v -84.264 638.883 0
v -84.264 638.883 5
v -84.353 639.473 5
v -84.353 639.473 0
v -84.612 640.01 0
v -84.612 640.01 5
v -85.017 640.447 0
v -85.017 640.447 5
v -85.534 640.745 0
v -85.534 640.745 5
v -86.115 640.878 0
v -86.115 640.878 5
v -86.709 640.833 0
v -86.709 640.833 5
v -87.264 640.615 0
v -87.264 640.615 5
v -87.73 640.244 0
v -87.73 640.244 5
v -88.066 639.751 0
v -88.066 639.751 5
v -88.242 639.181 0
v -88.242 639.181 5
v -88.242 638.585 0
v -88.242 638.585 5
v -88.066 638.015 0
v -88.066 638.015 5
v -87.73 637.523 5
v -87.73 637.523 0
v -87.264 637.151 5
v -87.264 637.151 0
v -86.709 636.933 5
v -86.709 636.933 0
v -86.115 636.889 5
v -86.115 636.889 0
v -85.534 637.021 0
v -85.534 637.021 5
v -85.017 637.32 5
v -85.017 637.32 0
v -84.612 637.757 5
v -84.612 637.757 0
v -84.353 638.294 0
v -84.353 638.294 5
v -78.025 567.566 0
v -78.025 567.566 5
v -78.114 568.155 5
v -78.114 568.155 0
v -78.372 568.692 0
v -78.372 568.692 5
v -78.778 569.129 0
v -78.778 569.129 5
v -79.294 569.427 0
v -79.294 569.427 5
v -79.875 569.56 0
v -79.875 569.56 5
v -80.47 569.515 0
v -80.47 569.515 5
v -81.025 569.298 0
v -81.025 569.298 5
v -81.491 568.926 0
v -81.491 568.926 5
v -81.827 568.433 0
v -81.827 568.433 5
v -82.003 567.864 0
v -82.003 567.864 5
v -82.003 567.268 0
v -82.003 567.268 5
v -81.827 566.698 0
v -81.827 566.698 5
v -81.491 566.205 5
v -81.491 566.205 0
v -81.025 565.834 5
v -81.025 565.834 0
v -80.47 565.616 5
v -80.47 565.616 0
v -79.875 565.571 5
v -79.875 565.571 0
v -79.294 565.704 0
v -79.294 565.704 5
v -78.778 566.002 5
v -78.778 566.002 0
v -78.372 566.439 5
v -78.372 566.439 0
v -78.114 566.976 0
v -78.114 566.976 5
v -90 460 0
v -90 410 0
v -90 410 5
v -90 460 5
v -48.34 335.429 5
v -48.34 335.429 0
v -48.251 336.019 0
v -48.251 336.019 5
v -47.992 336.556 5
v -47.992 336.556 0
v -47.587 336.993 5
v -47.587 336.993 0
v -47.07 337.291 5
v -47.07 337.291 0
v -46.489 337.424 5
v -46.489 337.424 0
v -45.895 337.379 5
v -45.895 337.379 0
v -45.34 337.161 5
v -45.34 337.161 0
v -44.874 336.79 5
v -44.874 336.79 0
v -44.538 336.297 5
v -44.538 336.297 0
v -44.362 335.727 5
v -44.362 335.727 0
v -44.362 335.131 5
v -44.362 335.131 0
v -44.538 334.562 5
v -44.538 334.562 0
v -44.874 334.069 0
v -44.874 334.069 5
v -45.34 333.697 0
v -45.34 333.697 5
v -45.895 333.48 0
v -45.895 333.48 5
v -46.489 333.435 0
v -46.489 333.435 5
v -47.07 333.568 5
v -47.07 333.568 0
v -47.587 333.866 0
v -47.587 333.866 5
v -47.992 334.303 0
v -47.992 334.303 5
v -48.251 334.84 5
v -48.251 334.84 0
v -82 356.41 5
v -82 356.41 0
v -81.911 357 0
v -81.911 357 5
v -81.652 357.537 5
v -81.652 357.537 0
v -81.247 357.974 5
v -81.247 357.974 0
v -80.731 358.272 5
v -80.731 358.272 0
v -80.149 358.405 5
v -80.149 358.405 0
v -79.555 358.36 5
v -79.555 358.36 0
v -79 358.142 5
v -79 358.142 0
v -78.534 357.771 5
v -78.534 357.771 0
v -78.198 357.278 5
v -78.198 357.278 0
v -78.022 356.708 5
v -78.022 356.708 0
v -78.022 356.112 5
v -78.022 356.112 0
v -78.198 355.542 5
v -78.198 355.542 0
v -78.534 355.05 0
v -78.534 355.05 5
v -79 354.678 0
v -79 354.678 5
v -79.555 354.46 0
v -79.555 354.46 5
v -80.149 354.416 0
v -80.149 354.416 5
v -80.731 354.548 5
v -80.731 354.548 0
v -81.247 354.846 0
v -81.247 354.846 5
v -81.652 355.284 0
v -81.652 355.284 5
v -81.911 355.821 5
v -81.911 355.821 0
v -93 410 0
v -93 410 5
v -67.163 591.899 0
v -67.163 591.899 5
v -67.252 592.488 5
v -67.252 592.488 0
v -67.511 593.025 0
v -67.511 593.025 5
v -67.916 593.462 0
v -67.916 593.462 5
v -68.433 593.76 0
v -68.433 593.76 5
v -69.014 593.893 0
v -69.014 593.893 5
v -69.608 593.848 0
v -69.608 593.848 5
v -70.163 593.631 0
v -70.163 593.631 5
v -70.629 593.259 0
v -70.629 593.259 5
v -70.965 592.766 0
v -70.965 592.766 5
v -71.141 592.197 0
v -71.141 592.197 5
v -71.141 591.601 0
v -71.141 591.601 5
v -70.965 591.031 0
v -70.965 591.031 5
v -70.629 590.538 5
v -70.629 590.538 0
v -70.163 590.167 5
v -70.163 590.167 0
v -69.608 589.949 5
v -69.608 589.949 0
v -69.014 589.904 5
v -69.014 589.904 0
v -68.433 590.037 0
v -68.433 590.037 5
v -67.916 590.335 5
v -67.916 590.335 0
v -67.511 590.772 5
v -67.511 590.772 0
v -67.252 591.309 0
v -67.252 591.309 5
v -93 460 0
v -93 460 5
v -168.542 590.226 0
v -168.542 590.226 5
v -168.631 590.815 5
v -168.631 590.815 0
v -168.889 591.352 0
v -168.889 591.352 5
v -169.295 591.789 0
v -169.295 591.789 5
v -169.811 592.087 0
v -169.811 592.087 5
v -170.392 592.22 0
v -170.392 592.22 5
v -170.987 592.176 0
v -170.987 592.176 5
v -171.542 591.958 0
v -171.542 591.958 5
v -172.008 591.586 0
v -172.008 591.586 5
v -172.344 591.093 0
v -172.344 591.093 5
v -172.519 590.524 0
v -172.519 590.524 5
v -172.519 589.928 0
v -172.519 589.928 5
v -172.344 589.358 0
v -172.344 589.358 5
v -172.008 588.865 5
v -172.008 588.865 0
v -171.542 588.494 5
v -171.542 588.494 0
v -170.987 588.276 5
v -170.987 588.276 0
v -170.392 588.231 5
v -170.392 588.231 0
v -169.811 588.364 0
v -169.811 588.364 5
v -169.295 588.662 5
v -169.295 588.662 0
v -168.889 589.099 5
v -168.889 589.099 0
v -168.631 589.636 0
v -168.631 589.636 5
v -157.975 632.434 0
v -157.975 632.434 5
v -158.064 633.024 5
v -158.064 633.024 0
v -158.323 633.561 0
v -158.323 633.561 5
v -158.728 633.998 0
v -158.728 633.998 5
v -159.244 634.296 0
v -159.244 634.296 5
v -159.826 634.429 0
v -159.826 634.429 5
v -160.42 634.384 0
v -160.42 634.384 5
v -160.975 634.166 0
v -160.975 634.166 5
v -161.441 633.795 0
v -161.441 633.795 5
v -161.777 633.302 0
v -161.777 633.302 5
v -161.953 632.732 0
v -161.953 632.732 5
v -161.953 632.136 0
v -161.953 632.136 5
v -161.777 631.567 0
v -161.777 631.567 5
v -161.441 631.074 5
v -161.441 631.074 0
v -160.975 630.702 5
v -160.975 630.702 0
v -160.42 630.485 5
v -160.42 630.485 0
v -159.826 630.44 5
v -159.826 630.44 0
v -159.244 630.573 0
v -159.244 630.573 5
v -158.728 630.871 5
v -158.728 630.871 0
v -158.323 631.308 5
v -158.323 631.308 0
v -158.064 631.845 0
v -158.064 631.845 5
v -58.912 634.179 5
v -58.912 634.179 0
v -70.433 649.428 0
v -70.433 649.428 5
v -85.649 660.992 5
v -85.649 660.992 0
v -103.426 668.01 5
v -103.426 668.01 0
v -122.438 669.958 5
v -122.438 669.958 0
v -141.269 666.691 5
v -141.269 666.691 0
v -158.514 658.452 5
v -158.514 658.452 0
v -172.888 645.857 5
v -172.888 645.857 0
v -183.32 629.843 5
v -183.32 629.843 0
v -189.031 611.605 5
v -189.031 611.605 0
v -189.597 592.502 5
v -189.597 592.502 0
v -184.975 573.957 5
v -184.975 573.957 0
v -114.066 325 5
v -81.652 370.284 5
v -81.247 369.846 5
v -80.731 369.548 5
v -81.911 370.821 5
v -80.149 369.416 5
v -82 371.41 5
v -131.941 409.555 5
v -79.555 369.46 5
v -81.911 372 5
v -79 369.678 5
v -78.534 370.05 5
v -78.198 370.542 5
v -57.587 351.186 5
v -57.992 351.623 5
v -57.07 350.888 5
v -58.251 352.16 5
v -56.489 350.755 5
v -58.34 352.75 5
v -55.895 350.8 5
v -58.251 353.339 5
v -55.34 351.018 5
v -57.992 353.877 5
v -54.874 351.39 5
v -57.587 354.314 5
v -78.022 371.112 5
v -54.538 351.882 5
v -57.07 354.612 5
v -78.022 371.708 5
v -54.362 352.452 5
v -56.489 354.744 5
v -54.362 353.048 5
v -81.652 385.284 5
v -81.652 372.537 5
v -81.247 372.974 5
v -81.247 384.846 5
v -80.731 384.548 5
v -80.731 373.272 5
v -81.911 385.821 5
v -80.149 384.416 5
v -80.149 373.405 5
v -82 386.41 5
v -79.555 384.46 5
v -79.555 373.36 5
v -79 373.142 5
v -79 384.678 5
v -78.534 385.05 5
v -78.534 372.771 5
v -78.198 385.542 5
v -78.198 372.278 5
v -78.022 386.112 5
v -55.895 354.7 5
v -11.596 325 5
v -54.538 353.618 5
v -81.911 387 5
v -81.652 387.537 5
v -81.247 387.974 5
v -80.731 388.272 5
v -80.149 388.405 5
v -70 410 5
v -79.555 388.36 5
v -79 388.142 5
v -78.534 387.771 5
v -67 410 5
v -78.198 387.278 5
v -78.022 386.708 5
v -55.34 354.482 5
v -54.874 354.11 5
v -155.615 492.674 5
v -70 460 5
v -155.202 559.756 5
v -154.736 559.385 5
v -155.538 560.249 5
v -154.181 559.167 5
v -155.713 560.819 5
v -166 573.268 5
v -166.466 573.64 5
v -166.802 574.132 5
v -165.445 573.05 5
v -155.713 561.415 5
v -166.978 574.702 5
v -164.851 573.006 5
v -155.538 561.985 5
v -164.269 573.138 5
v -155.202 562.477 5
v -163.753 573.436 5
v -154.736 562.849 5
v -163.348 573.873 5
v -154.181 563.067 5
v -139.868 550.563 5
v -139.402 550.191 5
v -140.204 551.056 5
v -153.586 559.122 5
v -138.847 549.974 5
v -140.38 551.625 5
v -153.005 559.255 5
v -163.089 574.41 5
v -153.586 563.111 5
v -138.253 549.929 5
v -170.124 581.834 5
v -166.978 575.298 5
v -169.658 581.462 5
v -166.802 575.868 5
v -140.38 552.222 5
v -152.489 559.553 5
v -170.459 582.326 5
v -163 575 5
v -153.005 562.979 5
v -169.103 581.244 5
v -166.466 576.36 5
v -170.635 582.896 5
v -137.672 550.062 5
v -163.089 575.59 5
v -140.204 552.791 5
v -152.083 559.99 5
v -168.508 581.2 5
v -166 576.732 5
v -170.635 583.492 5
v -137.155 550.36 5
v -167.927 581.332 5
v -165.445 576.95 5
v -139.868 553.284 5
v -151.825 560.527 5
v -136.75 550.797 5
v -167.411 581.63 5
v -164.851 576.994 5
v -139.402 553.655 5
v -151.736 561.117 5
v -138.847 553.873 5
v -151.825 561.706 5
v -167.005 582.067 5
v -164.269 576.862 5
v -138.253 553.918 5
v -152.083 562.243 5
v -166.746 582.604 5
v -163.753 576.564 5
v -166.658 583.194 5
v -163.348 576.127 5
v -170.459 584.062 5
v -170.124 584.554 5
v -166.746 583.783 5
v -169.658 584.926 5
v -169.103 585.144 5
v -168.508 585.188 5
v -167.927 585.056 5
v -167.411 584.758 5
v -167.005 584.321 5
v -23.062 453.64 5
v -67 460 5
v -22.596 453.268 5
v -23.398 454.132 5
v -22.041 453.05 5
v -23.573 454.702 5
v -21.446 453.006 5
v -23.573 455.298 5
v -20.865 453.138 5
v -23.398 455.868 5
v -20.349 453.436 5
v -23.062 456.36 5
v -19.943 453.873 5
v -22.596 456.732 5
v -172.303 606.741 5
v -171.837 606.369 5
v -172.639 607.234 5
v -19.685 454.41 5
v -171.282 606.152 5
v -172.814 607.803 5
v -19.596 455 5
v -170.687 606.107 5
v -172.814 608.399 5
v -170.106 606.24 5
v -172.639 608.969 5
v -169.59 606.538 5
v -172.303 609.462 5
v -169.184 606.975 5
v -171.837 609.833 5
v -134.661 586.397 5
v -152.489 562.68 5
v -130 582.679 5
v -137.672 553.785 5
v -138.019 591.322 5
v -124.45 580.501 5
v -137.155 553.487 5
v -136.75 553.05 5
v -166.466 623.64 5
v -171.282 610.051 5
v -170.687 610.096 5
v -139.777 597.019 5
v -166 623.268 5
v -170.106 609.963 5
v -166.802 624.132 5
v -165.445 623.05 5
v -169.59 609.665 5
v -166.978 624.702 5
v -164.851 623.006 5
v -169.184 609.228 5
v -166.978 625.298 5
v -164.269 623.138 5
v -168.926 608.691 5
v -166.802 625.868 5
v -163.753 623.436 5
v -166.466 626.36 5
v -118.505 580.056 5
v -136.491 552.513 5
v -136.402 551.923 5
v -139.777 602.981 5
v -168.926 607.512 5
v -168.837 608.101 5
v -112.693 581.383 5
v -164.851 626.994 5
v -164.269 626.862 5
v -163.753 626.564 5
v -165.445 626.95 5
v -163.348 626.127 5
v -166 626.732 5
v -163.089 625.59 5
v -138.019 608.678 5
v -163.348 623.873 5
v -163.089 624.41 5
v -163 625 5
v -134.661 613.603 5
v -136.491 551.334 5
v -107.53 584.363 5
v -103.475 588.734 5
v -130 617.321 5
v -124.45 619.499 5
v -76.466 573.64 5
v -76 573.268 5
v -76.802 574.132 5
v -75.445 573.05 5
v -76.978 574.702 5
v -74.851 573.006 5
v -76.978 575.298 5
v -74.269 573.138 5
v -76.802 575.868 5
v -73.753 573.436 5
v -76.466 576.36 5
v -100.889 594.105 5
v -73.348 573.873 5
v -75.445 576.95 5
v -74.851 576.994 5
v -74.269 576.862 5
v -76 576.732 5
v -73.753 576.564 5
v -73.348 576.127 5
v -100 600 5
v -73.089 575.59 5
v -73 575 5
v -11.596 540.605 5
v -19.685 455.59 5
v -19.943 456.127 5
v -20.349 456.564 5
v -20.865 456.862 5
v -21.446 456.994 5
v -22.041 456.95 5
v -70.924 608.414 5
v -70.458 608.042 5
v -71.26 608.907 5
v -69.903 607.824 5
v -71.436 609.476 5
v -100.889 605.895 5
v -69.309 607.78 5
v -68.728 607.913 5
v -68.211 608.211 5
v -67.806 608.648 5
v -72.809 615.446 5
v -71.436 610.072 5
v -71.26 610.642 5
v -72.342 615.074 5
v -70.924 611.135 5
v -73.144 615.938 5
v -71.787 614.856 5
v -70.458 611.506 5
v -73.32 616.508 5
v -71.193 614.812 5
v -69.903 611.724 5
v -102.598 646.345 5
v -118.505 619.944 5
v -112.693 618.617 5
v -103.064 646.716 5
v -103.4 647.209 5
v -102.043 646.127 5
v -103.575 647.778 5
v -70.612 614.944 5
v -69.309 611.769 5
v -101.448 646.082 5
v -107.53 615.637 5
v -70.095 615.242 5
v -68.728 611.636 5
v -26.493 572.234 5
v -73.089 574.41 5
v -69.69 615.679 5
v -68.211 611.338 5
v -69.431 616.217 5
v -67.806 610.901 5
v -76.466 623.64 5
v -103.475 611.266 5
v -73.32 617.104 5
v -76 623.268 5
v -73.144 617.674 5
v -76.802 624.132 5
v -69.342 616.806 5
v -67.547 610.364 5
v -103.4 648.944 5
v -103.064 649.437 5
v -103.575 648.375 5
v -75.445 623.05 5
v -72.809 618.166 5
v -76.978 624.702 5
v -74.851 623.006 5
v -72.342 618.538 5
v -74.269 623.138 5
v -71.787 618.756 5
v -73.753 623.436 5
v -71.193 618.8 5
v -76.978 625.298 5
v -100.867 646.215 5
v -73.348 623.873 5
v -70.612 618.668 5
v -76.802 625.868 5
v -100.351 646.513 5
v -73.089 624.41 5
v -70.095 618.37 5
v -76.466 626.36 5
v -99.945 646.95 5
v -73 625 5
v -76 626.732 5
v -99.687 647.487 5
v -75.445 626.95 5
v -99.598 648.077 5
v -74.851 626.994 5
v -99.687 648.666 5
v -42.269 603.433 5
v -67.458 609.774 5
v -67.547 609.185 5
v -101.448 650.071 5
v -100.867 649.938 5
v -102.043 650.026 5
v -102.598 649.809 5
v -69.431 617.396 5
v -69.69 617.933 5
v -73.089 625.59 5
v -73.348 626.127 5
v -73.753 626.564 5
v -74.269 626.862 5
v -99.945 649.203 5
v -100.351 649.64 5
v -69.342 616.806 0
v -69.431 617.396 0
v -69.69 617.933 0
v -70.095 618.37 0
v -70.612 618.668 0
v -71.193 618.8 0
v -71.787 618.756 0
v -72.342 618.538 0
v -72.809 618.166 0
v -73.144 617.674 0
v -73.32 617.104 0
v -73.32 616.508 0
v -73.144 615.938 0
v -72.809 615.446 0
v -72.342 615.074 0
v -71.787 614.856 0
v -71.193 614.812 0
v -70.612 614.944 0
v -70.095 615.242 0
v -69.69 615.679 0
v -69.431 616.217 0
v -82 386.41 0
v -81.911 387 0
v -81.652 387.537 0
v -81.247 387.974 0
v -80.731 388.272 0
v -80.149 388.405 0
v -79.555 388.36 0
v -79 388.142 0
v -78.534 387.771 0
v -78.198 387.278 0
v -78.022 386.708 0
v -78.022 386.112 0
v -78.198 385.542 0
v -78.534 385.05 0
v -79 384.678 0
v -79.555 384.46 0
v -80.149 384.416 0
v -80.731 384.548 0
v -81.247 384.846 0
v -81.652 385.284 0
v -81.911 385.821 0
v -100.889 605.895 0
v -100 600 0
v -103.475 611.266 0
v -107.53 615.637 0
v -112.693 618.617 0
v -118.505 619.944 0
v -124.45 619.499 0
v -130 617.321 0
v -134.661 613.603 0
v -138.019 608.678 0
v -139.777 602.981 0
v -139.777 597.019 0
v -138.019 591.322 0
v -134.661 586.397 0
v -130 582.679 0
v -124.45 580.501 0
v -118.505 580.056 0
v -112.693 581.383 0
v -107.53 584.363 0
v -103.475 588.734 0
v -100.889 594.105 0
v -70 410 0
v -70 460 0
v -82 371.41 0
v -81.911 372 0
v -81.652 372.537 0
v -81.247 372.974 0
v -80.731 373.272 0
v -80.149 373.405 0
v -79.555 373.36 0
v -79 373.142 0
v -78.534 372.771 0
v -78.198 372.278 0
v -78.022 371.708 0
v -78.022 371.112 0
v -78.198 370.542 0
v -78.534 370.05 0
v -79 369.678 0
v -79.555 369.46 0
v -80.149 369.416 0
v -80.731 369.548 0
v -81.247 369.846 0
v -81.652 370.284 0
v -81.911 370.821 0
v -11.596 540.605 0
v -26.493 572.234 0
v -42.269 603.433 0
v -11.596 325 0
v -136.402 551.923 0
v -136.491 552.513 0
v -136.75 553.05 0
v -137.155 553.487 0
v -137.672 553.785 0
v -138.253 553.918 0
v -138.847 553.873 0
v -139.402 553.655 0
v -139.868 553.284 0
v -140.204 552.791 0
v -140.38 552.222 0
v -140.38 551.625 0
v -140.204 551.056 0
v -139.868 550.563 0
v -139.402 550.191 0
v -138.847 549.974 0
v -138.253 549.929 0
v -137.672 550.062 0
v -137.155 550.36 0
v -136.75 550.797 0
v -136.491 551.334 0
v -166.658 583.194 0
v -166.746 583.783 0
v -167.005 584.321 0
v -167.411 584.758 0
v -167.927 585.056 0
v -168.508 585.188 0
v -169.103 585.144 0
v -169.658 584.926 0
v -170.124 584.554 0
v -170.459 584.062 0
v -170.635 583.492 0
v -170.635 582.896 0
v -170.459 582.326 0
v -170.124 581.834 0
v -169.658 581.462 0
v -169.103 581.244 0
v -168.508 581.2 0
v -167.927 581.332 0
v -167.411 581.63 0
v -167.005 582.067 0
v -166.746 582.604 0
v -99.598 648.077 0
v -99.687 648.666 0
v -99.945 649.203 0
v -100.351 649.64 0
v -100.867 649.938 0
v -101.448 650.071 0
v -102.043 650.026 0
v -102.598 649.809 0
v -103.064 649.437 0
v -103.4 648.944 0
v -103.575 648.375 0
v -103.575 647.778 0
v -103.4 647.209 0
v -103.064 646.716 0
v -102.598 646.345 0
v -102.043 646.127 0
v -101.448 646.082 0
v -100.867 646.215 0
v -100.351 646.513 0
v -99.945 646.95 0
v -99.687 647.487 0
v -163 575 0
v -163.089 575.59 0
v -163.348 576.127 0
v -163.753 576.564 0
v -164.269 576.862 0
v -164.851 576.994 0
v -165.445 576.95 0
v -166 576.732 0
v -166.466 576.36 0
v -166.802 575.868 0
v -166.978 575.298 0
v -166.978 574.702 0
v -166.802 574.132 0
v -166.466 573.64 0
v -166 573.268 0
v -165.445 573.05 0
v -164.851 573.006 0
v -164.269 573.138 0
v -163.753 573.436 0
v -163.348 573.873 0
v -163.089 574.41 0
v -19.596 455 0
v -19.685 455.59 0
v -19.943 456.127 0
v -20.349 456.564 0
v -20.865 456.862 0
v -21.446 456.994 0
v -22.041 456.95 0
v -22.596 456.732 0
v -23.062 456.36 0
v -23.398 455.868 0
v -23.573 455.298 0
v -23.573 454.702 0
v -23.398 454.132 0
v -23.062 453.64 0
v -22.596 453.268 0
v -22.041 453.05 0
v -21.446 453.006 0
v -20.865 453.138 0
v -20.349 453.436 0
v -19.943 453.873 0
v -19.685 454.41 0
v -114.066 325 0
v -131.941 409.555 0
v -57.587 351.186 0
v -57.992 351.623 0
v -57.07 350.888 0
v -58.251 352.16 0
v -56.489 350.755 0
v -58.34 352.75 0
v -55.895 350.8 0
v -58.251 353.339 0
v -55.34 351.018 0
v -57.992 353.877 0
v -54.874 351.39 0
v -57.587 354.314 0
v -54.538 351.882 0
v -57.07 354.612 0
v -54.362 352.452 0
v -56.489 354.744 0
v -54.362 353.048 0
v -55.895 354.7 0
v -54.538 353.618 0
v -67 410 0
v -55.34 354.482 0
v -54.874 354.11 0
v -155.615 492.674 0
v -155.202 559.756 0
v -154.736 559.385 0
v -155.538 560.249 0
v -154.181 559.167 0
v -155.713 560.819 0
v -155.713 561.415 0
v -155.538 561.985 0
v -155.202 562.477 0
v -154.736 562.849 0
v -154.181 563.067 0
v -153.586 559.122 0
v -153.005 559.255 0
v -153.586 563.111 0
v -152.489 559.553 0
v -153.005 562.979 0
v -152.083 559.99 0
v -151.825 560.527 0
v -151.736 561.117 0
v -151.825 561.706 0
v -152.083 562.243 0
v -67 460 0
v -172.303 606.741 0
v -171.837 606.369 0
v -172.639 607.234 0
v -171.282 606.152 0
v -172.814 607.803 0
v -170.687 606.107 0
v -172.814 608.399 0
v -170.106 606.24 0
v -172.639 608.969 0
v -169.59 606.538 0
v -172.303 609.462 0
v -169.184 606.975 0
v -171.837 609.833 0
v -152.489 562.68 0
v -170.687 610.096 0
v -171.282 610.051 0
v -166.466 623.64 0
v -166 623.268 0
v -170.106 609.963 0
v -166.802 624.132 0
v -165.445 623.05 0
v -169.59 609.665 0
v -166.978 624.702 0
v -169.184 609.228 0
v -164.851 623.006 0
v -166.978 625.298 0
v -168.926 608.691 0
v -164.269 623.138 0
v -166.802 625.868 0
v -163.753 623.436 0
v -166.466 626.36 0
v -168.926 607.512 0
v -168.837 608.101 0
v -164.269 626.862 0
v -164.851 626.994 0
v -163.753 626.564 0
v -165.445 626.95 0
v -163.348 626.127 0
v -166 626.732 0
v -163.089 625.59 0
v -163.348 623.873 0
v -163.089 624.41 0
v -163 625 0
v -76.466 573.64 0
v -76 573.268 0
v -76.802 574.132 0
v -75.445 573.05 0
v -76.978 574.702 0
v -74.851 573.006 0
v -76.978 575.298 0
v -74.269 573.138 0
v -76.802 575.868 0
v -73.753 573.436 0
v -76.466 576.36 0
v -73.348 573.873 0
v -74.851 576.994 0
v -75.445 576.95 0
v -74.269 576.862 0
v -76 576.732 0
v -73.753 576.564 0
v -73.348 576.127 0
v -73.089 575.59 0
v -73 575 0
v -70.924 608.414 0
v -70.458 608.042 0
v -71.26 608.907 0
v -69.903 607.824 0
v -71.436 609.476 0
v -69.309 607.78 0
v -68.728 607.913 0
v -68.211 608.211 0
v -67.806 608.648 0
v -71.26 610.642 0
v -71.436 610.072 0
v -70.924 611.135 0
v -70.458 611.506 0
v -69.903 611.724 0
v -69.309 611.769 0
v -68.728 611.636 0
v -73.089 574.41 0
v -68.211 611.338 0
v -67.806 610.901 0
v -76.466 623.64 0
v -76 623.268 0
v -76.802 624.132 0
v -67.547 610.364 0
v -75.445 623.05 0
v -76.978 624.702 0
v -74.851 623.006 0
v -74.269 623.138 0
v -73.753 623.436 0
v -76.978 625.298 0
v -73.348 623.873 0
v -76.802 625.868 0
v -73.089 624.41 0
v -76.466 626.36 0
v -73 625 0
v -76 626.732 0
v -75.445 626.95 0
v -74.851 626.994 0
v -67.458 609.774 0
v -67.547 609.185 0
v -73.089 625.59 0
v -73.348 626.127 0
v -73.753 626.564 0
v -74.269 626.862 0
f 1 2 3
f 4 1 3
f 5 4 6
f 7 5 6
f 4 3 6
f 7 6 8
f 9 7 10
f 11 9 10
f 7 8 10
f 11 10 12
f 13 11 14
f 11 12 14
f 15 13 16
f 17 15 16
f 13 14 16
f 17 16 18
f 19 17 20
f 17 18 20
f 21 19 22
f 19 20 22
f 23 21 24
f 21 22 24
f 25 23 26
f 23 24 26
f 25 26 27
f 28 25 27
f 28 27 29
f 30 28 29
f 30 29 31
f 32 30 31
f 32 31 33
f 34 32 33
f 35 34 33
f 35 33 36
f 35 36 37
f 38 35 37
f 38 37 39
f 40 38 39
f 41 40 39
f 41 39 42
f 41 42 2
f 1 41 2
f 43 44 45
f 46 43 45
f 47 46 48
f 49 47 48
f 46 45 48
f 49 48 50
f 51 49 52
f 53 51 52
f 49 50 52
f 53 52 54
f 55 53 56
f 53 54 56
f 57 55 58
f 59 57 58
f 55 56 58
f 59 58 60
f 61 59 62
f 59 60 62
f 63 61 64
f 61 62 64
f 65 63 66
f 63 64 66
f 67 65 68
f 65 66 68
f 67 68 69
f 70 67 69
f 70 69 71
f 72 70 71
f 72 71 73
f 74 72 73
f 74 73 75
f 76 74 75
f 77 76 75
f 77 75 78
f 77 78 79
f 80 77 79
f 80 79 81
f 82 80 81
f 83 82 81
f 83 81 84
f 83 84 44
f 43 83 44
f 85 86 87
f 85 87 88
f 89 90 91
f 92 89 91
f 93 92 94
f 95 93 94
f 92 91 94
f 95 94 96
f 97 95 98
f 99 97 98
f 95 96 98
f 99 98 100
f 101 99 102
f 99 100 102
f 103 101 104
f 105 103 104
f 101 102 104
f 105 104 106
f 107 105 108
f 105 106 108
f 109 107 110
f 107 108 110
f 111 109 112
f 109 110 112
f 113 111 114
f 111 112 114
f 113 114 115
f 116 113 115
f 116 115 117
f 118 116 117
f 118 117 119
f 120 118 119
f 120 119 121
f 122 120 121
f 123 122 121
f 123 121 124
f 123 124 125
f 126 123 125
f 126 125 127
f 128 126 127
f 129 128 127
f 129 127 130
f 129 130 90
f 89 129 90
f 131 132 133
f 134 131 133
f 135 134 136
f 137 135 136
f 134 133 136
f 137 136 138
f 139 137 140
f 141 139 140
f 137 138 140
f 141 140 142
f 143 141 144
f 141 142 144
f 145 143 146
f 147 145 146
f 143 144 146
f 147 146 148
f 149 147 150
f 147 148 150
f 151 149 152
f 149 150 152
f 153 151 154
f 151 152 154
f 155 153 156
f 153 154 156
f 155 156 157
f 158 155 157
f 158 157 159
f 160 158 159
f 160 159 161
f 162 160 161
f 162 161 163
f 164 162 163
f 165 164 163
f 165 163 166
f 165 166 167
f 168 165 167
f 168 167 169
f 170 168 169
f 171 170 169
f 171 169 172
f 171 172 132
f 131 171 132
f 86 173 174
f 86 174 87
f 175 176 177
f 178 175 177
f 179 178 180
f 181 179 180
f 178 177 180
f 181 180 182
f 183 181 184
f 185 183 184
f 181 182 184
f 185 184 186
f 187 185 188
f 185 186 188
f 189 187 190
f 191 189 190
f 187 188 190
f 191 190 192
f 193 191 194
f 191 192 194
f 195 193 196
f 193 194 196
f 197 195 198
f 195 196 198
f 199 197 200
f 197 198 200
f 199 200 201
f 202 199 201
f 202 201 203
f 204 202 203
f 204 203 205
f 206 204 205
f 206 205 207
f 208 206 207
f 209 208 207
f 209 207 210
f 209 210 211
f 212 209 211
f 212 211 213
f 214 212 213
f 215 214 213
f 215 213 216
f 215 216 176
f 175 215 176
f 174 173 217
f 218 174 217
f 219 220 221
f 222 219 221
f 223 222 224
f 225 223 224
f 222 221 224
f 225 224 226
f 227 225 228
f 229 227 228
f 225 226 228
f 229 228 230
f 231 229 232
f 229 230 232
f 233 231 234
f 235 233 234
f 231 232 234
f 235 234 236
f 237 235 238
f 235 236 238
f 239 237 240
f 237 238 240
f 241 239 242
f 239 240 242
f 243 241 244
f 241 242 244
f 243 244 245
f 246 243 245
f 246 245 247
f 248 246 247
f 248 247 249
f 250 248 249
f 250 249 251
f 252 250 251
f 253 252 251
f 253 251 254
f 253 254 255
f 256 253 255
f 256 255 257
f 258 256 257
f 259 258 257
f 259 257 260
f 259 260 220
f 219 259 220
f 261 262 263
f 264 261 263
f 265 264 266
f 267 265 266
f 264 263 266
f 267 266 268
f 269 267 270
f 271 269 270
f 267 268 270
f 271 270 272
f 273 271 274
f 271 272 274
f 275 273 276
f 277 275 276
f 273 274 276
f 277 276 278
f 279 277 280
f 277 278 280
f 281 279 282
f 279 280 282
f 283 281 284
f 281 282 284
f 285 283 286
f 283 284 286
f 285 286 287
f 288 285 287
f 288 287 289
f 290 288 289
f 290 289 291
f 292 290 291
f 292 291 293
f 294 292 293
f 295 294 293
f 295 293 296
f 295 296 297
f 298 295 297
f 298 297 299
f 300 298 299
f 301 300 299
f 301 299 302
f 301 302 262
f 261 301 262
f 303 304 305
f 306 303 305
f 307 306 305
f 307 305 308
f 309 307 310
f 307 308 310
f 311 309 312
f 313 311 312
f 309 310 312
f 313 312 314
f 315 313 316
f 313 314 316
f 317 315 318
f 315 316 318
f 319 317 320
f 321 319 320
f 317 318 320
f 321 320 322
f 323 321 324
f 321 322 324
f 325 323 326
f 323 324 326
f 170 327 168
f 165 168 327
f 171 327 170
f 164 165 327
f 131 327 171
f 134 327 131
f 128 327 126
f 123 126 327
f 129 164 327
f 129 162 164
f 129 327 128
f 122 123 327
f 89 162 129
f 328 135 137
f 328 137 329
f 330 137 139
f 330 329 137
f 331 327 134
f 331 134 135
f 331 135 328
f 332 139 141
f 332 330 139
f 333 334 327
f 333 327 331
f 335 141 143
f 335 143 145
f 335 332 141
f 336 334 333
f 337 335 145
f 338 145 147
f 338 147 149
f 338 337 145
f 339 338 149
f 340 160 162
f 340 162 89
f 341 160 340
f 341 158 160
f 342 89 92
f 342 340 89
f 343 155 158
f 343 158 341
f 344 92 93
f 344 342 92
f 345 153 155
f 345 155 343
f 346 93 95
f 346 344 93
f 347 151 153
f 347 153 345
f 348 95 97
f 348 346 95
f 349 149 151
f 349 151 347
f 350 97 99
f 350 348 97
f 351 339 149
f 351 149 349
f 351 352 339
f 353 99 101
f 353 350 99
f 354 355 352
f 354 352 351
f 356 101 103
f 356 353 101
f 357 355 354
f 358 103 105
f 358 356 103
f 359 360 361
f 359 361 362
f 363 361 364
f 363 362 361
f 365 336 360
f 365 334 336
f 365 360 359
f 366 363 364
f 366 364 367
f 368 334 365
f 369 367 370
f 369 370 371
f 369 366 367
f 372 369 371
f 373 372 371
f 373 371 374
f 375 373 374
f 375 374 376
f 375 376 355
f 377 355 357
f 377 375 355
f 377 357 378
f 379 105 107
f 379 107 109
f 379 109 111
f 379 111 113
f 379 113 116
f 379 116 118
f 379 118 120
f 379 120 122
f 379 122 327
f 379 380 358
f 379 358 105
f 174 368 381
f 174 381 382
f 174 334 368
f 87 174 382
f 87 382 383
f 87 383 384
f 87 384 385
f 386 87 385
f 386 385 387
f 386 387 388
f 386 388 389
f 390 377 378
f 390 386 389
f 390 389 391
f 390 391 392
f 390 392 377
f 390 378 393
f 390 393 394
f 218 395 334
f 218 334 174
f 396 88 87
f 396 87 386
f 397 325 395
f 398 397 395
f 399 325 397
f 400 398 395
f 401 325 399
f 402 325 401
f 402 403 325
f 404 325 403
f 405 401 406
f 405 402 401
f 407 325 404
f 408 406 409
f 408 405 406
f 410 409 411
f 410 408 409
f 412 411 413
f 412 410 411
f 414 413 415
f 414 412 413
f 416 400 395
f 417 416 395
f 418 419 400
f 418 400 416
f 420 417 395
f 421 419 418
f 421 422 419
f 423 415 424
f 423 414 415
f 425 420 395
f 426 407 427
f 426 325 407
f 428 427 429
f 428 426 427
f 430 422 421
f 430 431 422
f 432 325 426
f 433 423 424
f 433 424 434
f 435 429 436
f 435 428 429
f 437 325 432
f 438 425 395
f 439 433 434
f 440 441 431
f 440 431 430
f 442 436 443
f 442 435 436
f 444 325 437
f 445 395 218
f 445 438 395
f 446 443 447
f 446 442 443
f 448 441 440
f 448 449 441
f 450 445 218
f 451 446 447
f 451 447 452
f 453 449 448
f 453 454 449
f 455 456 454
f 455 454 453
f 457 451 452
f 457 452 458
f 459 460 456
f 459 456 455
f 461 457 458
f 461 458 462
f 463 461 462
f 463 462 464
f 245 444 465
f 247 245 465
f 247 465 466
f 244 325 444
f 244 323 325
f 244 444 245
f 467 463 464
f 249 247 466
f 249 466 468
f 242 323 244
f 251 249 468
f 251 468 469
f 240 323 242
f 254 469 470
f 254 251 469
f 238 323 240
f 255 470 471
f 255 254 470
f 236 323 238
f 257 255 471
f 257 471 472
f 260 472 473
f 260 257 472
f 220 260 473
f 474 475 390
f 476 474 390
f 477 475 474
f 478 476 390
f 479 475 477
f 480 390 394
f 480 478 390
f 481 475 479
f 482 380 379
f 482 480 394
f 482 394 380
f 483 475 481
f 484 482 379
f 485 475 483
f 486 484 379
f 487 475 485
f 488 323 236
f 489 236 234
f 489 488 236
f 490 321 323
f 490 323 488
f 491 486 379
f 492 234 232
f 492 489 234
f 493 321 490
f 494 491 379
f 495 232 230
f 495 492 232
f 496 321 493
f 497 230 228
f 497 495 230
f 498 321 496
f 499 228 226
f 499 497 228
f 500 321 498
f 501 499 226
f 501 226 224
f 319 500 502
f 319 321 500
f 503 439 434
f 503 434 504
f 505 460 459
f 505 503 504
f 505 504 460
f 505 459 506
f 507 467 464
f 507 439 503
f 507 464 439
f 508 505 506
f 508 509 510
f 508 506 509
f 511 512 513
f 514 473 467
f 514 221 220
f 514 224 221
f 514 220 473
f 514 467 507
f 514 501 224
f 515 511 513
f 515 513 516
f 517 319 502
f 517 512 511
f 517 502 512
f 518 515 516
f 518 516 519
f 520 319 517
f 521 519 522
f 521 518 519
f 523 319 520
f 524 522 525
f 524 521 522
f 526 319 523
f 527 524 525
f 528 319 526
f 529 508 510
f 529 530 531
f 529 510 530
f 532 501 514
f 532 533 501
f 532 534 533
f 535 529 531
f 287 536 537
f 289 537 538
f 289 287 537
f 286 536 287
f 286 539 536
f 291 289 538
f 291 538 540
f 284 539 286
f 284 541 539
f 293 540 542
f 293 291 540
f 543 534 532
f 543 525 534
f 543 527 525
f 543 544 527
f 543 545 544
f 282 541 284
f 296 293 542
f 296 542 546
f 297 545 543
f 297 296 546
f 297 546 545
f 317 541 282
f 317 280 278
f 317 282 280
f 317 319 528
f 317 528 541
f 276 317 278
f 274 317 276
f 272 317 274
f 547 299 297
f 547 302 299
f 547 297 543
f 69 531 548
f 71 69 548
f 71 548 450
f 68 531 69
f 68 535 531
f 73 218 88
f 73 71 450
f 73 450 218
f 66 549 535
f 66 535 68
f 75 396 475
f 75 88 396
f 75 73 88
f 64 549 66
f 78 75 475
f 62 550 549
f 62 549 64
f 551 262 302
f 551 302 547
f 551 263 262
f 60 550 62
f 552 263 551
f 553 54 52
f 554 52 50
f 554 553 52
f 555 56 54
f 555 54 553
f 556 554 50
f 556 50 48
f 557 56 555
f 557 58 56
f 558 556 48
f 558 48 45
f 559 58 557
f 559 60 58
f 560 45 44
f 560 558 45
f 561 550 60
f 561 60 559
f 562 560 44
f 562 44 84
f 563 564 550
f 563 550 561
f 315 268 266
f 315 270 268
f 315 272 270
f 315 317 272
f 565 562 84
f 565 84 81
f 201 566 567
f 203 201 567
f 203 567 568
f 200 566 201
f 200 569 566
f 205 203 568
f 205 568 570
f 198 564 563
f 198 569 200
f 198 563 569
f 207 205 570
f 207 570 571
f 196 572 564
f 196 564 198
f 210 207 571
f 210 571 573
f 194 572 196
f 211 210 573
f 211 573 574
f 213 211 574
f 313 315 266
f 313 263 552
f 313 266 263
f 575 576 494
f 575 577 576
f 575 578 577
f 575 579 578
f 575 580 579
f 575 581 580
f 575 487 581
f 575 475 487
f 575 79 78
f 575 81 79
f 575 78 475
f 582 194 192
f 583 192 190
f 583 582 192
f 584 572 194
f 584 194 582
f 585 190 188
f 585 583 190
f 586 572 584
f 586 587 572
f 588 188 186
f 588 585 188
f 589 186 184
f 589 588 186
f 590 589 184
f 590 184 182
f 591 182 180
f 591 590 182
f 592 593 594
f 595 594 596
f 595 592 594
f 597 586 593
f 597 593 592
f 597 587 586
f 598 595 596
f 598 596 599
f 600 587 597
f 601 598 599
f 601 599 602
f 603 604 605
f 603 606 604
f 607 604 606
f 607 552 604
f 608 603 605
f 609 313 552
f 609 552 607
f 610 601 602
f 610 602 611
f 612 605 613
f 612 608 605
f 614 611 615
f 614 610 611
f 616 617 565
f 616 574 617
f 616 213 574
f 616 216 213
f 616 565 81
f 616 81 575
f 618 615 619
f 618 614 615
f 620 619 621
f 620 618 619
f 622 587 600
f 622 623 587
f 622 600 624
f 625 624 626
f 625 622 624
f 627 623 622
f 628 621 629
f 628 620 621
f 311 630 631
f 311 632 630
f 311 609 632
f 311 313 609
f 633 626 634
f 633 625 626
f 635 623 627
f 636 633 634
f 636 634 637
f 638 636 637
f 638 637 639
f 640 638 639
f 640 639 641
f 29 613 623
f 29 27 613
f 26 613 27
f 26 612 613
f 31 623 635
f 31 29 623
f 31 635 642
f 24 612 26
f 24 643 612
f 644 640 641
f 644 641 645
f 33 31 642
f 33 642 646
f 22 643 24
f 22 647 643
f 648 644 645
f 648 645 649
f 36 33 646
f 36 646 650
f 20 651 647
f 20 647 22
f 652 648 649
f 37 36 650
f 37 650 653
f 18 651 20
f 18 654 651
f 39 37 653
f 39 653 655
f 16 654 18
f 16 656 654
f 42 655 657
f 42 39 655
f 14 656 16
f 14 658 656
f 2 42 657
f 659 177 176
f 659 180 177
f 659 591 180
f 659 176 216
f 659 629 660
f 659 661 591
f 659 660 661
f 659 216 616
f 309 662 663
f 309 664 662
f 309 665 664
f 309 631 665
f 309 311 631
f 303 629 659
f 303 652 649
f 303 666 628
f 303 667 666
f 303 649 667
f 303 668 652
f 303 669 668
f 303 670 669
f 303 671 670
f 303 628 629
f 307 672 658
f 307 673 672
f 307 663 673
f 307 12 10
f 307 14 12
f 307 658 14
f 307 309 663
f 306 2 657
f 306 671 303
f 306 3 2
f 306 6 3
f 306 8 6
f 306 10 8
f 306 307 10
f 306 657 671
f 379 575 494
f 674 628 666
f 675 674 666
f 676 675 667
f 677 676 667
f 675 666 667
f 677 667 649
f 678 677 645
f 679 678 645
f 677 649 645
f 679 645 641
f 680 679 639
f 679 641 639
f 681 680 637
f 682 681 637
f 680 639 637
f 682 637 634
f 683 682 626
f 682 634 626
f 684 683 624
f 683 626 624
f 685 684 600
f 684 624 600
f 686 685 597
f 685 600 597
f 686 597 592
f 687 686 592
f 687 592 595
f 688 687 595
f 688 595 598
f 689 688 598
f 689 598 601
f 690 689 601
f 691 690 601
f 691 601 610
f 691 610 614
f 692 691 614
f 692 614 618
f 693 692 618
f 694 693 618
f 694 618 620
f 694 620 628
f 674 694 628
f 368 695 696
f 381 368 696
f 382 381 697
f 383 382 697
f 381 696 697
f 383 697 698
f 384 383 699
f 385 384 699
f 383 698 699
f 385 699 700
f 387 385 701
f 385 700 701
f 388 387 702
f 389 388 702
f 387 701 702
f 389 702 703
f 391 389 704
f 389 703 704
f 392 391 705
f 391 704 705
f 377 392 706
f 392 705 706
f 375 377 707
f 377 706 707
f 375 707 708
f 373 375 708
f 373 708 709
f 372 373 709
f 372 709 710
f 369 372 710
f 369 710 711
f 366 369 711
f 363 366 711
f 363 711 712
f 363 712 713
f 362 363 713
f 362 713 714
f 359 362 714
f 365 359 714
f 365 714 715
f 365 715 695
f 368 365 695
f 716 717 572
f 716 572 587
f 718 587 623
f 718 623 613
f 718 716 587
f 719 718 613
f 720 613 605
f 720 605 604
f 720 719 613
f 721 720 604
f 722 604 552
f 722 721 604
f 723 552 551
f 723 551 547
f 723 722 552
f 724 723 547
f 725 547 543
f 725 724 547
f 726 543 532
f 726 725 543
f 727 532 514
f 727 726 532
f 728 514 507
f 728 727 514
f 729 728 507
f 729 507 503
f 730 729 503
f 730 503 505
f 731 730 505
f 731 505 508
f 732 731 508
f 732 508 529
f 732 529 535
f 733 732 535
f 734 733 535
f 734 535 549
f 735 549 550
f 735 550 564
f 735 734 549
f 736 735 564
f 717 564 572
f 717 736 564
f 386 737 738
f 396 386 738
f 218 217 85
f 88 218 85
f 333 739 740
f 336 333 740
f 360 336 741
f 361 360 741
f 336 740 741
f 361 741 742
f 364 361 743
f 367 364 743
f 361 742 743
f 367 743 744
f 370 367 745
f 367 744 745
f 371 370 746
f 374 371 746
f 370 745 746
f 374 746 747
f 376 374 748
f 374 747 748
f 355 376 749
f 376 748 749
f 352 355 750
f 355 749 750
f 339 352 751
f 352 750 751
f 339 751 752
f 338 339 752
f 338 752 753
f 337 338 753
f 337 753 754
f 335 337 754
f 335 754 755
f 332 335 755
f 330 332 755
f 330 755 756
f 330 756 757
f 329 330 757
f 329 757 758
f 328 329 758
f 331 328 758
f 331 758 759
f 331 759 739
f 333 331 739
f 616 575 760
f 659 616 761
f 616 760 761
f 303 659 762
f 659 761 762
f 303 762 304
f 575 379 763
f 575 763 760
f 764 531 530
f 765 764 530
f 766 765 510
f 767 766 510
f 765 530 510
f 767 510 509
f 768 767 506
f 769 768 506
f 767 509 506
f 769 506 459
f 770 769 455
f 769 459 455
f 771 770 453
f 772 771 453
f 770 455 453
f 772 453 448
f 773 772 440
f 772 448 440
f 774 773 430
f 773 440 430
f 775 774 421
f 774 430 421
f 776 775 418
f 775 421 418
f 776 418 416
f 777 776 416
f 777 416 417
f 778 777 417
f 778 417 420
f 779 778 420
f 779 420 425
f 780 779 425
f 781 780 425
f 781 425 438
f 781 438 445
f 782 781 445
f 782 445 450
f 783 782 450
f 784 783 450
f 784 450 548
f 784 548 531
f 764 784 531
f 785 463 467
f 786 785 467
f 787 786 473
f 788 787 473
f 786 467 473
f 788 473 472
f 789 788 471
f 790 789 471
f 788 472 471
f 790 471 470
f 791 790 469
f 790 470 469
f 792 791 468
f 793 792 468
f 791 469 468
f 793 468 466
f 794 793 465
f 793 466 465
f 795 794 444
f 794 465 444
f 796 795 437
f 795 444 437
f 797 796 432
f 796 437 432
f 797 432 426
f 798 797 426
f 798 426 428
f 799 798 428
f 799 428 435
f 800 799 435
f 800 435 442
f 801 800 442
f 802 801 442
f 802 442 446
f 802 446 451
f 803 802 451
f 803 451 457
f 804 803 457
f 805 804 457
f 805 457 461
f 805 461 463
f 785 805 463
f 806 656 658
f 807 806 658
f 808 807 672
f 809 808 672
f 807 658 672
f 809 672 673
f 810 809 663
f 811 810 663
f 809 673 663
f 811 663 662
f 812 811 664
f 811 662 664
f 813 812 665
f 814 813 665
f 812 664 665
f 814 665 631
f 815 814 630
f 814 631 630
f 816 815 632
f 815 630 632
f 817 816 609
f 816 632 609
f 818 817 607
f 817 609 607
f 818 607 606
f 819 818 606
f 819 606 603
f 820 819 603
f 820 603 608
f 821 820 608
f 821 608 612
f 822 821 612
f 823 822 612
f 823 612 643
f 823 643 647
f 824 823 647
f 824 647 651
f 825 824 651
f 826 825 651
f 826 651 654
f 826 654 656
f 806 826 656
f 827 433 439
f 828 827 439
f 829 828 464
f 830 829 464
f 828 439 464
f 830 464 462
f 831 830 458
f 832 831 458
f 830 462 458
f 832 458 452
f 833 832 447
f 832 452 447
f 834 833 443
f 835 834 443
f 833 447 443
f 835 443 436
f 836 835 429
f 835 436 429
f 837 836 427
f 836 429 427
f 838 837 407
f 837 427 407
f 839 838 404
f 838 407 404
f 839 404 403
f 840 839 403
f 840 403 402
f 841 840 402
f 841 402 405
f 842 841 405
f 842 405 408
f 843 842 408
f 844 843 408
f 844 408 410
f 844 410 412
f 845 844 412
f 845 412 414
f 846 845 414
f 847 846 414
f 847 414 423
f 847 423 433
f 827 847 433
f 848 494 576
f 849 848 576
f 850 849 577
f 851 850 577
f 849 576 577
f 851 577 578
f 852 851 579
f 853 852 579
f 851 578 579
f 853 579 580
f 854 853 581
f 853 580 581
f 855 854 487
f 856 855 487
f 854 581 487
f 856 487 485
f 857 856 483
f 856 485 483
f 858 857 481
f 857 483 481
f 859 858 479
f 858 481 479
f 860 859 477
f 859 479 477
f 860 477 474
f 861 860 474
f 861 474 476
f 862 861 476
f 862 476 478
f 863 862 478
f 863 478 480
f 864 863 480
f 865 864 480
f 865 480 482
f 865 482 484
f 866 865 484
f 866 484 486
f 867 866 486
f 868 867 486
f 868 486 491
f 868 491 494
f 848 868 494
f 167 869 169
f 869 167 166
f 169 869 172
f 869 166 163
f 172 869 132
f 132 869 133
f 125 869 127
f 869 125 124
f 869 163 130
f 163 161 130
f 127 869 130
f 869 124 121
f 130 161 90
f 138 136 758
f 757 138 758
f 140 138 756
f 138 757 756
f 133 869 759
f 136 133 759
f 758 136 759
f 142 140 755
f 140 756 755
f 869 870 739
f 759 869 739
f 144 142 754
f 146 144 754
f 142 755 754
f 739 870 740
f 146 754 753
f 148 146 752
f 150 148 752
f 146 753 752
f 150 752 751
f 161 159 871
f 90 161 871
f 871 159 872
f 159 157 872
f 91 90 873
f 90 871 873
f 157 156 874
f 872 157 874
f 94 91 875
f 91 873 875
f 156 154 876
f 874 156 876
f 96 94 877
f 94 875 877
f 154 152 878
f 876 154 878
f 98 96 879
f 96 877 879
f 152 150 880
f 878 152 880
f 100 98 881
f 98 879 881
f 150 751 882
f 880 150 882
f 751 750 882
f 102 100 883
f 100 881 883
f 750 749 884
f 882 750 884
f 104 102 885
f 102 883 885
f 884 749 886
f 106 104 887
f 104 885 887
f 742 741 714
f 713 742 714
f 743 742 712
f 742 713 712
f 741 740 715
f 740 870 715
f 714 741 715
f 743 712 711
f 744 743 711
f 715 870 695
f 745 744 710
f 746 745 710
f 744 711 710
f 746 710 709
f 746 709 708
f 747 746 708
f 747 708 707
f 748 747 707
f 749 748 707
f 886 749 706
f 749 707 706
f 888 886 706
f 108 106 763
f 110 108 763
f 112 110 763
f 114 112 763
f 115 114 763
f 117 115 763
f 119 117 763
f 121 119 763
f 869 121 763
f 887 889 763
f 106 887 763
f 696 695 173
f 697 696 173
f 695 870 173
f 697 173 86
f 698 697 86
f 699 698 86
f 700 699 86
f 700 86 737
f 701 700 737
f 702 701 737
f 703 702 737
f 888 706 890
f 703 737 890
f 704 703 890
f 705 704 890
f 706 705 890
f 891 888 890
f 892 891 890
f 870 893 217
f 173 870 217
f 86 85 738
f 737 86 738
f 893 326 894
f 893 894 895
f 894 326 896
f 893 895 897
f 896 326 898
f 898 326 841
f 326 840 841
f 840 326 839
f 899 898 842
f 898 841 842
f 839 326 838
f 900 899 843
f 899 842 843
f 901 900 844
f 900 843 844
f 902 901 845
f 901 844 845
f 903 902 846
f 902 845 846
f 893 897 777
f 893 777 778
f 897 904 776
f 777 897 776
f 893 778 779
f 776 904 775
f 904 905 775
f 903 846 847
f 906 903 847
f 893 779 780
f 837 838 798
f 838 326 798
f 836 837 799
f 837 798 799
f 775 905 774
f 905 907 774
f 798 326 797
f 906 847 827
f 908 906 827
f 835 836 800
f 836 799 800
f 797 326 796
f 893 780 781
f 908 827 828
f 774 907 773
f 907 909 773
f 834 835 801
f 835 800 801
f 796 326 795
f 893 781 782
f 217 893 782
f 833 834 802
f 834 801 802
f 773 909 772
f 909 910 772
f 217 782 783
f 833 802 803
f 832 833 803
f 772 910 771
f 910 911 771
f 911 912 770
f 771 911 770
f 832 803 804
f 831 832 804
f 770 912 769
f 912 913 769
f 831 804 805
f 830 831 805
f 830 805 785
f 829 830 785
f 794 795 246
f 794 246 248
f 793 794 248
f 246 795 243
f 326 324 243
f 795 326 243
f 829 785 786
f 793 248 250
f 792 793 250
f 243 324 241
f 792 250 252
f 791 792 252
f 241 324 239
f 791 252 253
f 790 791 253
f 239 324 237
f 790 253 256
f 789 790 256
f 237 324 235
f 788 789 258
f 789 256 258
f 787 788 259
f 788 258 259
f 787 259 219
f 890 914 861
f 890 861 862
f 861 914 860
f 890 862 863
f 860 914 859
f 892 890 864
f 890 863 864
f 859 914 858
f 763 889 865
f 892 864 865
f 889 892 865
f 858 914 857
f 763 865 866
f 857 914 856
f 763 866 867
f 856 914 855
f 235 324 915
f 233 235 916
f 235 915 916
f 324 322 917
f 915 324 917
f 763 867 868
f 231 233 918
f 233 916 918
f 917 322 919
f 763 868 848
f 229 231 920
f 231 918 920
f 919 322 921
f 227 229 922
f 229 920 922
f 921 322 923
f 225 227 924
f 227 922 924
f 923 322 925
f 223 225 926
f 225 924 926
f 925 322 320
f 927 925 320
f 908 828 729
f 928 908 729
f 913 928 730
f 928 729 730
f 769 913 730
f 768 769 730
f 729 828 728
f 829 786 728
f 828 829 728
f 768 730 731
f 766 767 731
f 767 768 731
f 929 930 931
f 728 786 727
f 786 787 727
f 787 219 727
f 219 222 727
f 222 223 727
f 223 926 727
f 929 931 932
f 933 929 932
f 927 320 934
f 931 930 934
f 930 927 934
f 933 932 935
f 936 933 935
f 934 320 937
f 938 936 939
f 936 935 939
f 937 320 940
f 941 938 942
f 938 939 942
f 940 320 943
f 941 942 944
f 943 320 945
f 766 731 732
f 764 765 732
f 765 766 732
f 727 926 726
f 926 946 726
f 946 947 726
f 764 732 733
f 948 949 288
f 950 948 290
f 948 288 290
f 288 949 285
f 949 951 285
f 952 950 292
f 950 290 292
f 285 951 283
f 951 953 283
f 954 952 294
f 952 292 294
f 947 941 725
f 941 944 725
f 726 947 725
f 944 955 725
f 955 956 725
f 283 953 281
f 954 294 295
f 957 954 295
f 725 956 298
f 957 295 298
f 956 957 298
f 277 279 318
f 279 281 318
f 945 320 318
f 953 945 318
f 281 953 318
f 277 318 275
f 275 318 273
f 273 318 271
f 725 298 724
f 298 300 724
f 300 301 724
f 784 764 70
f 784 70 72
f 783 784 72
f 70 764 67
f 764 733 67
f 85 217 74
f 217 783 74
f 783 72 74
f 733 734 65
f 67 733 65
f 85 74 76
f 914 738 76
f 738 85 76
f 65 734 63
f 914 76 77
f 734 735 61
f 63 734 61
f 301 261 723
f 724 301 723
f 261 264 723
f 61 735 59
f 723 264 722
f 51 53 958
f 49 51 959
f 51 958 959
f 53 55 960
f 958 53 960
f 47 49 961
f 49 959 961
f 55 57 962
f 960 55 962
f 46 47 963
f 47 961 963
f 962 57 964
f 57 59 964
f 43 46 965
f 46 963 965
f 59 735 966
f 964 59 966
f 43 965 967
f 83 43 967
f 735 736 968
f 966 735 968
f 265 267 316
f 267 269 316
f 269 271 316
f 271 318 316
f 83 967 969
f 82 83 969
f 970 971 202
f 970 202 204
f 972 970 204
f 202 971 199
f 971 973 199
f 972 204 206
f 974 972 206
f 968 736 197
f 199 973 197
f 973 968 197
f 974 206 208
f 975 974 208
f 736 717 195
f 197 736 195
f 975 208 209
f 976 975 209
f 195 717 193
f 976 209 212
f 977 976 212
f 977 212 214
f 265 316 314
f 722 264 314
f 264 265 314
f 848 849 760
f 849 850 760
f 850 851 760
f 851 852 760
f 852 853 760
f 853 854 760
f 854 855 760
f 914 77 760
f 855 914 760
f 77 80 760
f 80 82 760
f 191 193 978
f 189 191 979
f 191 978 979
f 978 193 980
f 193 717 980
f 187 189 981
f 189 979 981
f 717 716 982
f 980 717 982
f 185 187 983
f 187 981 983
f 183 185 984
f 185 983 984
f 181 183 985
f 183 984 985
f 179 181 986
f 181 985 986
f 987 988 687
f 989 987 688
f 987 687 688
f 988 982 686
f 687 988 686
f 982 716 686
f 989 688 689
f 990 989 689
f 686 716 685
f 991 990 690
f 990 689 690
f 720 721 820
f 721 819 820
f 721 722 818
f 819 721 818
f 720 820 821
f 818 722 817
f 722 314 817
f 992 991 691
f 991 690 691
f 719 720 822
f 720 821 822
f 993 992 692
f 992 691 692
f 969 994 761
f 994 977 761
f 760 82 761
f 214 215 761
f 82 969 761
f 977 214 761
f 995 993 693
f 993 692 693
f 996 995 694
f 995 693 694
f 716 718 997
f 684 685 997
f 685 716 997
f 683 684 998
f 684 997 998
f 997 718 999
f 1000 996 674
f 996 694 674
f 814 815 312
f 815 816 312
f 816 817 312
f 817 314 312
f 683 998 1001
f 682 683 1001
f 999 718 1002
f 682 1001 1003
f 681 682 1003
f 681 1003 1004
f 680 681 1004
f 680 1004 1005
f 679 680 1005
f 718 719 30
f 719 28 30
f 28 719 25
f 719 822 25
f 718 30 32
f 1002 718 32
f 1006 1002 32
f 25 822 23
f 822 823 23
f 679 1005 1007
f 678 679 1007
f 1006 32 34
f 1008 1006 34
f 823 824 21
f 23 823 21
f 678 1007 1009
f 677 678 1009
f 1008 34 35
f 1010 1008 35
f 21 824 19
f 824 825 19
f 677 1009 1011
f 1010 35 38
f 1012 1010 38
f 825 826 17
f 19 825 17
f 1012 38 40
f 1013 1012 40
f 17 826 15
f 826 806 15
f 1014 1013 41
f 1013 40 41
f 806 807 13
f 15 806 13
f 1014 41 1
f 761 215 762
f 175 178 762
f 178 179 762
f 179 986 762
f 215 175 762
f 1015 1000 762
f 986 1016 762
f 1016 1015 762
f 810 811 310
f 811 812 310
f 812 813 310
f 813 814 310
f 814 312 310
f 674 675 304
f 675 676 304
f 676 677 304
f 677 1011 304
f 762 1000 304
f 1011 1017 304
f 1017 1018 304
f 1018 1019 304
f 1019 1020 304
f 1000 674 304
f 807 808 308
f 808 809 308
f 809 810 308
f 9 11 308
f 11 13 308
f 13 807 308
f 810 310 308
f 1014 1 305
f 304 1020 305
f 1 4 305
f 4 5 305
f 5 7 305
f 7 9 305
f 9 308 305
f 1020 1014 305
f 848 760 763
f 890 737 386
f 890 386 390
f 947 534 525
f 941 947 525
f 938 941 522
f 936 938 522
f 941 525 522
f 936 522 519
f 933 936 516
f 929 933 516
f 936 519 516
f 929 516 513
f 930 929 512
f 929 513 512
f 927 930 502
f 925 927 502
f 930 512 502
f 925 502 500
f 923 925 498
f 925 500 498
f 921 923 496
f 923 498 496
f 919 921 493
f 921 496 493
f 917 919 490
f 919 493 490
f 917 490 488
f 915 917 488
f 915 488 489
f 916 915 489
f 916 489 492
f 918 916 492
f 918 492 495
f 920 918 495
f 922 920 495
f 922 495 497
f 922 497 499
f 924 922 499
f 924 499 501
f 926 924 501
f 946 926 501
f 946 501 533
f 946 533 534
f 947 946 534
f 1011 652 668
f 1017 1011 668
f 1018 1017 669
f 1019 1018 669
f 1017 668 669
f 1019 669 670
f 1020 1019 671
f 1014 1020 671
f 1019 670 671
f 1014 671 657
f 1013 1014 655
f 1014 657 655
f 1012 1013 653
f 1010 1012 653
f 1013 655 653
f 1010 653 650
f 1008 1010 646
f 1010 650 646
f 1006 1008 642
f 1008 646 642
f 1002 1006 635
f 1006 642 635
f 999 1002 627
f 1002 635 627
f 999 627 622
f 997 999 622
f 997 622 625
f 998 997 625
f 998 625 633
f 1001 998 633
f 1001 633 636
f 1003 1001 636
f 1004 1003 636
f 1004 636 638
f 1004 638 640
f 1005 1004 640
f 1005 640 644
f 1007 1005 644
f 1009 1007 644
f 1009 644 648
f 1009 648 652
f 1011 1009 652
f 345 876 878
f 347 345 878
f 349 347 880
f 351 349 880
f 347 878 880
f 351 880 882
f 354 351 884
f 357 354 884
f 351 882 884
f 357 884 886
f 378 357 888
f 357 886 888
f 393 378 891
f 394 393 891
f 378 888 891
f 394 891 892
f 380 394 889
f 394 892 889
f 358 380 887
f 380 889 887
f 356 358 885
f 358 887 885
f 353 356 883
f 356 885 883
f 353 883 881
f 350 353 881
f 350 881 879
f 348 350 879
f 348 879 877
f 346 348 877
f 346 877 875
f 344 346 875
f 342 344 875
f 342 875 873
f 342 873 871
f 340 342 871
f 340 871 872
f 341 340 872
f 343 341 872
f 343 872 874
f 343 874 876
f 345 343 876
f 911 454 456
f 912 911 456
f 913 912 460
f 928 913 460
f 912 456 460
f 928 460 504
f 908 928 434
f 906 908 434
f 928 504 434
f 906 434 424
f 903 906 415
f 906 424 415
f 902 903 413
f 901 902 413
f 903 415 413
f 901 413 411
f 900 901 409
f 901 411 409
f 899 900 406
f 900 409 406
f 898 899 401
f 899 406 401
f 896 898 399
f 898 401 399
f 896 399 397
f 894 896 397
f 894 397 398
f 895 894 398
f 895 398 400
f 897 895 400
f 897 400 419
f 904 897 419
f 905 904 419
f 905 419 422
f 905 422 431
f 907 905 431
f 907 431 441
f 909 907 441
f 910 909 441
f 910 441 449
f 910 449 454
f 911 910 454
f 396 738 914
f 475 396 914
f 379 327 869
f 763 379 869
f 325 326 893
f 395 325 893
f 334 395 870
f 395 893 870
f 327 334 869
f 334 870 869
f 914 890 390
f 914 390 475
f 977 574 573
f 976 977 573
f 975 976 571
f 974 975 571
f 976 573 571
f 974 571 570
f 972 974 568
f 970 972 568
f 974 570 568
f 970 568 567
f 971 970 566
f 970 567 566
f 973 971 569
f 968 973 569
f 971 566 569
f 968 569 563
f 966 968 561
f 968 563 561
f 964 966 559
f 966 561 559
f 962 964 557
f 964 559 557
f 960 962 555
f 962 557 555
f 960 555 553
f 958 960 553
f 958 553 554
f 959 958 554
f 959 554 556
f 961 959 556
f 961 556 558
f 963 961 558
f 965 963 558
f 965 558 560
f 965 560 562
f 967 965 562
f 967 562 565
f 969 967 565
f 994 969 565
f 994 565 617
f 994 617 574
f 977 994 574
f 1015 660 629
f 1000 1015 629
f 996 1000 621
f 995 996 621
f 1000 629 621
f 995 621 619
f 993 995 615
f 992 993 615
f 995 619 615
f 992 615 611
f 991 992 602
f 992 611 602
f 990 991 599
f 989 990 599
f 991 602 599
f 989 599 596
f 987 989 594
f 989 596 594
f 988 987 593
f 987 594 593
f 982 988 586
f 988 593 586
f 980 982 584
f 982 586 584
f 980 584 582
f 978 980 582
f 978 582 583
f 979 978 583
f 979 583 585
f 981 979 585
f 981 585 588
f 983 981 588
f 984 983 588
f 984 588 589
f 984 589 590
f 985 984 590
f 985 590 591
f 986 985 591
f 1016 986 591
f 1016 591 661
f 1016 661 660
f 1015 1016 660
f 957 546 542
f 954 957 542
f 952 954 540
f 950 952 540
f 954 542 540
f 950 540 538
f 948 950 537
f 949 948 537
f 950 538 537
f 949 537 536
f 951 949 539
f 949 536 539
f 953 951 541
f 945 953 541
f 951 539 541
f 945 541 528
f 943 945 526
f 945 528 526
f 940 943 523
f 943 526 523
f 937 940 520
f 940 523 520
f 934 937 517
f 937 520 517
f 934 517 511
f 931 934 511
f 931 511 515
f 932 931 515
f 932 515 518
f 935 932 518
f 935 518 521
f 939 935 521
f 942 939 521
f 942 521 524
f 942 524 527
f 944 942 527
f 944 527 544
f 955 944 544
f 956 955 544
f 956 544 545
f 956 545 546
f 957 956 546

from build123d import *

# Parameters (mm, degrees)
SKETCH_1_R          = 2
SKETCH_1_W          = 3
SKETCH_1_H          = 50
SKETCH_1_R_2        = 70
SKETCH_1_R_3        = 20
EXTRUDE_1_DEPTH     = 5
SKETCH_2_R          = 2
CUT_EXTRUDE_1_DEPTH = 697.437362582
SKETCH_3_R          = 2
CUT_EXTRUDE_2_DEPTH = 697.437362582
SKETCH_4_R          = 2
CUT_EXTRUDE_3_DEPTH = 10


with BuildPart() as part:
    # 草图1 → 凸台-拉伸1 (new body)
    # profile 1 of 2: a face of its own
    with BuildSketch(Plane.XY):
        with BuildLine():
            ThreePointArc((-184.975195398, 573.957266214), (-108.724882678, 291.977251427), (-100, 0))
            Line((-100, 0), (-100, -10))
            Line((-100, -10), (-91, -10))
            Line((-91, -10), (-91, 11))
            Line((-91, 11), (-69, 11))
            Line((-69, 11), (-69, -10))
            Line((-69, -10), (100, -10))
            Line((100, -10), (100, 0))
            ThreePointArc((100, 0), (62.740102222, 327.663103245), (-58.911784918, 634.179379428))
            ThreePointArc((-58.911784918, 634.179379428), (-52.264577008, 617.661043914), (-50, 600))
            ThreePointArc((-50, 600), (-106.738470636, 531.267679808), (-184.975195398, 573.957266214))
        make_face()
        with Locations((-50, 0)):
            Circle(SKETCH_1_R, mode=Mode.SUBTRACT)
        Circle(SKETCH_1_R, mode=Mode.SUBTRACT)
        with Locations((50, 0)):
            Circle(SKETCH_1_R, mode=Mode.SUBTRACT)
        with Locations((-91.5, 435)):
            Rectangle(SKETCH_1_W, SKETCH_1_H, mode=Mode.SUBTRACT)
        with Locations((-68.5, 435)):
            Rectangle(SKETCH_1_W, SKETCH_1_H, mode=Mode.SUBTRACT)
    # profile 2 of 2: a face of its own
    with BuildSketch(Plane.XY):
        with Locations((-120, 600)):
            Circle(SKETCH_1_R_2)
        with Locations((-120, 600)):
            Circle(SKETCH_1_R_3, mode=Mode.SUBTRACT)
    extrude(amount=EXTRUDE_1_DEPTH)

    # 草图2 → 切除-拉伸1 (cut, through all)
    with BuildSketch(Plane(origin=(0, 0, 0), x_dir=(-1, 0, 0), z_dir=(0, 0, -1))):
        with Locations((80, 386.410161514)):
            Circle(SKETCH_2_R)
        with Locations((80, 371.410161514)):
            Circle(SKETCH_2_R)
        with Locations((80, 356.410161514)):
            Circle(SKETCH_2_R)
        with Locations((56.339745962, 352.749907476)):
            Circle(SKETCH_2_R)
        with Locations((46.339745962, 335.4293994)):
            Circle(SKETCH_2_R)
        with Locations((26.339745962, 300.788383249)):
            Circle(SKETCH_2_R)
        with Locations((6.339745962, 266.147367097)):
            Circle(SKETCH_2_R)
        with Locations((-13.660254038, 231.506350946)):
            Circle(SKETCH_2_R)
        with Locations((80, 76.410161514)):
            Circle(SKETCH_2_R)
        with Locations((80, 116.410161514)):
            Circle(SKETCH_2_R)
        with Locations((80, 236.410161514)):
            Circle(SKETCH_2_R)
        with Locations((80, 276.410161514)):
            Circle(SKETCH_2_R)
        with Locations((80, 316.410161514)):
            Circle(SKETCH_2_R)
    extrude(amount=-CUT_EXTRUDE_1_DEPTH, mode=Mode.SUBTRACT)

    # 草图3 → 切除-拉伸2 (cut, through all)
    with BuildSketch(Plane.XY.offset(5)):
        with Locations((-165, 625)):
            Circle(SKETCH_3_R)
        with Locations((-75, 625)):
            Circle(SKETCH_3_R)
        with Locations((-75, 575)):
            Circle(SKETCH_3_R)
        with Locations((-165, 575)):
            Circle(SKETCH_3_R)
        with Locations((-168.657553327, 583.19397417)):
            Circle(SKETCH_3_R)
        with Locations((-159.975144444, 632.43436182)):
            Circle(SKETCH_3_R)
        with Locations((-71.342446673, 616.80602583)):
            Circle(SKETCH_3_R)
        with Locations((-80.024855556, 567.56563818)):
            Circle(SKETCH_3_R)
        with Locations((-86.264335648, 638.883221969)):
            Circle(SKETCH_3_R)
        with Locations((-69.163328481, 591.89859093)):
            Circle(SKETCH_3_R)
        with Locations((-153.735664352, 561.116778031)):
            Circle(SKETCH_3_R)
        with Locations((-170.836671519, 608.10140907)):
            Circle(SKETCH_3_R)
        with Locations((-101.597690302, 648.076553514)):
            Circle(SKETCH_3_R)
        with Locations((-69.458309817, 609.774331358)):
            Circle(SKETCH_3_R)
        with Locations((-138.402309698, 551.923446486)):
            Circle(SKETCH_3_R)
        with Locations((-170.541690183, 590.225668642)):
            Circle(SKETCH_3_R)
    extrude(amount=-CUT_EXTRUDE_2_DEPTH, mode=Mode.SUBTRACT)


with BuildPart() as body_2:
    # Split Bodies 1: the piece on the far side of the plane
    add(part.part)
    split(bisect_by=Plane(origin=(0, 325, 0), x_dir=(0, 0, -1), z_dir=(0, -1, 0)), keep=Keep.BOTTOM)

    # 草图4 → 切除-拉伸3 (cut)
    with BuildSketch(Plane.XY.offset(5)):
        with Locations((-21.595687559, 455)):
            Circle(SKETCH_4_R)
        with BuildLine():
            Line((-11.595687559, 325), (-11.595687559, 540.604962521))
            ThreePointArc((-11.595687559, 540.604962521), (30.836385122, 434.518144234), (63.404312441, 325))
            Line((63.404312441, 325), (-11.595687559, 325))
        make_face()
    extrude(amount=-CUT_EXTRUDE_3_DEPTH, mode=Mode.SUBTRACT)


with BuildPart() as part_1:
    add(part.part)

    # Split Bodies 1
    split(bisect_by=Plane(origin=(0, 325, 0), x_dir=(0, 0, -1), z_dir=(0, -1, 0)), keep=Keep.TOP)


solid = body_2.part
